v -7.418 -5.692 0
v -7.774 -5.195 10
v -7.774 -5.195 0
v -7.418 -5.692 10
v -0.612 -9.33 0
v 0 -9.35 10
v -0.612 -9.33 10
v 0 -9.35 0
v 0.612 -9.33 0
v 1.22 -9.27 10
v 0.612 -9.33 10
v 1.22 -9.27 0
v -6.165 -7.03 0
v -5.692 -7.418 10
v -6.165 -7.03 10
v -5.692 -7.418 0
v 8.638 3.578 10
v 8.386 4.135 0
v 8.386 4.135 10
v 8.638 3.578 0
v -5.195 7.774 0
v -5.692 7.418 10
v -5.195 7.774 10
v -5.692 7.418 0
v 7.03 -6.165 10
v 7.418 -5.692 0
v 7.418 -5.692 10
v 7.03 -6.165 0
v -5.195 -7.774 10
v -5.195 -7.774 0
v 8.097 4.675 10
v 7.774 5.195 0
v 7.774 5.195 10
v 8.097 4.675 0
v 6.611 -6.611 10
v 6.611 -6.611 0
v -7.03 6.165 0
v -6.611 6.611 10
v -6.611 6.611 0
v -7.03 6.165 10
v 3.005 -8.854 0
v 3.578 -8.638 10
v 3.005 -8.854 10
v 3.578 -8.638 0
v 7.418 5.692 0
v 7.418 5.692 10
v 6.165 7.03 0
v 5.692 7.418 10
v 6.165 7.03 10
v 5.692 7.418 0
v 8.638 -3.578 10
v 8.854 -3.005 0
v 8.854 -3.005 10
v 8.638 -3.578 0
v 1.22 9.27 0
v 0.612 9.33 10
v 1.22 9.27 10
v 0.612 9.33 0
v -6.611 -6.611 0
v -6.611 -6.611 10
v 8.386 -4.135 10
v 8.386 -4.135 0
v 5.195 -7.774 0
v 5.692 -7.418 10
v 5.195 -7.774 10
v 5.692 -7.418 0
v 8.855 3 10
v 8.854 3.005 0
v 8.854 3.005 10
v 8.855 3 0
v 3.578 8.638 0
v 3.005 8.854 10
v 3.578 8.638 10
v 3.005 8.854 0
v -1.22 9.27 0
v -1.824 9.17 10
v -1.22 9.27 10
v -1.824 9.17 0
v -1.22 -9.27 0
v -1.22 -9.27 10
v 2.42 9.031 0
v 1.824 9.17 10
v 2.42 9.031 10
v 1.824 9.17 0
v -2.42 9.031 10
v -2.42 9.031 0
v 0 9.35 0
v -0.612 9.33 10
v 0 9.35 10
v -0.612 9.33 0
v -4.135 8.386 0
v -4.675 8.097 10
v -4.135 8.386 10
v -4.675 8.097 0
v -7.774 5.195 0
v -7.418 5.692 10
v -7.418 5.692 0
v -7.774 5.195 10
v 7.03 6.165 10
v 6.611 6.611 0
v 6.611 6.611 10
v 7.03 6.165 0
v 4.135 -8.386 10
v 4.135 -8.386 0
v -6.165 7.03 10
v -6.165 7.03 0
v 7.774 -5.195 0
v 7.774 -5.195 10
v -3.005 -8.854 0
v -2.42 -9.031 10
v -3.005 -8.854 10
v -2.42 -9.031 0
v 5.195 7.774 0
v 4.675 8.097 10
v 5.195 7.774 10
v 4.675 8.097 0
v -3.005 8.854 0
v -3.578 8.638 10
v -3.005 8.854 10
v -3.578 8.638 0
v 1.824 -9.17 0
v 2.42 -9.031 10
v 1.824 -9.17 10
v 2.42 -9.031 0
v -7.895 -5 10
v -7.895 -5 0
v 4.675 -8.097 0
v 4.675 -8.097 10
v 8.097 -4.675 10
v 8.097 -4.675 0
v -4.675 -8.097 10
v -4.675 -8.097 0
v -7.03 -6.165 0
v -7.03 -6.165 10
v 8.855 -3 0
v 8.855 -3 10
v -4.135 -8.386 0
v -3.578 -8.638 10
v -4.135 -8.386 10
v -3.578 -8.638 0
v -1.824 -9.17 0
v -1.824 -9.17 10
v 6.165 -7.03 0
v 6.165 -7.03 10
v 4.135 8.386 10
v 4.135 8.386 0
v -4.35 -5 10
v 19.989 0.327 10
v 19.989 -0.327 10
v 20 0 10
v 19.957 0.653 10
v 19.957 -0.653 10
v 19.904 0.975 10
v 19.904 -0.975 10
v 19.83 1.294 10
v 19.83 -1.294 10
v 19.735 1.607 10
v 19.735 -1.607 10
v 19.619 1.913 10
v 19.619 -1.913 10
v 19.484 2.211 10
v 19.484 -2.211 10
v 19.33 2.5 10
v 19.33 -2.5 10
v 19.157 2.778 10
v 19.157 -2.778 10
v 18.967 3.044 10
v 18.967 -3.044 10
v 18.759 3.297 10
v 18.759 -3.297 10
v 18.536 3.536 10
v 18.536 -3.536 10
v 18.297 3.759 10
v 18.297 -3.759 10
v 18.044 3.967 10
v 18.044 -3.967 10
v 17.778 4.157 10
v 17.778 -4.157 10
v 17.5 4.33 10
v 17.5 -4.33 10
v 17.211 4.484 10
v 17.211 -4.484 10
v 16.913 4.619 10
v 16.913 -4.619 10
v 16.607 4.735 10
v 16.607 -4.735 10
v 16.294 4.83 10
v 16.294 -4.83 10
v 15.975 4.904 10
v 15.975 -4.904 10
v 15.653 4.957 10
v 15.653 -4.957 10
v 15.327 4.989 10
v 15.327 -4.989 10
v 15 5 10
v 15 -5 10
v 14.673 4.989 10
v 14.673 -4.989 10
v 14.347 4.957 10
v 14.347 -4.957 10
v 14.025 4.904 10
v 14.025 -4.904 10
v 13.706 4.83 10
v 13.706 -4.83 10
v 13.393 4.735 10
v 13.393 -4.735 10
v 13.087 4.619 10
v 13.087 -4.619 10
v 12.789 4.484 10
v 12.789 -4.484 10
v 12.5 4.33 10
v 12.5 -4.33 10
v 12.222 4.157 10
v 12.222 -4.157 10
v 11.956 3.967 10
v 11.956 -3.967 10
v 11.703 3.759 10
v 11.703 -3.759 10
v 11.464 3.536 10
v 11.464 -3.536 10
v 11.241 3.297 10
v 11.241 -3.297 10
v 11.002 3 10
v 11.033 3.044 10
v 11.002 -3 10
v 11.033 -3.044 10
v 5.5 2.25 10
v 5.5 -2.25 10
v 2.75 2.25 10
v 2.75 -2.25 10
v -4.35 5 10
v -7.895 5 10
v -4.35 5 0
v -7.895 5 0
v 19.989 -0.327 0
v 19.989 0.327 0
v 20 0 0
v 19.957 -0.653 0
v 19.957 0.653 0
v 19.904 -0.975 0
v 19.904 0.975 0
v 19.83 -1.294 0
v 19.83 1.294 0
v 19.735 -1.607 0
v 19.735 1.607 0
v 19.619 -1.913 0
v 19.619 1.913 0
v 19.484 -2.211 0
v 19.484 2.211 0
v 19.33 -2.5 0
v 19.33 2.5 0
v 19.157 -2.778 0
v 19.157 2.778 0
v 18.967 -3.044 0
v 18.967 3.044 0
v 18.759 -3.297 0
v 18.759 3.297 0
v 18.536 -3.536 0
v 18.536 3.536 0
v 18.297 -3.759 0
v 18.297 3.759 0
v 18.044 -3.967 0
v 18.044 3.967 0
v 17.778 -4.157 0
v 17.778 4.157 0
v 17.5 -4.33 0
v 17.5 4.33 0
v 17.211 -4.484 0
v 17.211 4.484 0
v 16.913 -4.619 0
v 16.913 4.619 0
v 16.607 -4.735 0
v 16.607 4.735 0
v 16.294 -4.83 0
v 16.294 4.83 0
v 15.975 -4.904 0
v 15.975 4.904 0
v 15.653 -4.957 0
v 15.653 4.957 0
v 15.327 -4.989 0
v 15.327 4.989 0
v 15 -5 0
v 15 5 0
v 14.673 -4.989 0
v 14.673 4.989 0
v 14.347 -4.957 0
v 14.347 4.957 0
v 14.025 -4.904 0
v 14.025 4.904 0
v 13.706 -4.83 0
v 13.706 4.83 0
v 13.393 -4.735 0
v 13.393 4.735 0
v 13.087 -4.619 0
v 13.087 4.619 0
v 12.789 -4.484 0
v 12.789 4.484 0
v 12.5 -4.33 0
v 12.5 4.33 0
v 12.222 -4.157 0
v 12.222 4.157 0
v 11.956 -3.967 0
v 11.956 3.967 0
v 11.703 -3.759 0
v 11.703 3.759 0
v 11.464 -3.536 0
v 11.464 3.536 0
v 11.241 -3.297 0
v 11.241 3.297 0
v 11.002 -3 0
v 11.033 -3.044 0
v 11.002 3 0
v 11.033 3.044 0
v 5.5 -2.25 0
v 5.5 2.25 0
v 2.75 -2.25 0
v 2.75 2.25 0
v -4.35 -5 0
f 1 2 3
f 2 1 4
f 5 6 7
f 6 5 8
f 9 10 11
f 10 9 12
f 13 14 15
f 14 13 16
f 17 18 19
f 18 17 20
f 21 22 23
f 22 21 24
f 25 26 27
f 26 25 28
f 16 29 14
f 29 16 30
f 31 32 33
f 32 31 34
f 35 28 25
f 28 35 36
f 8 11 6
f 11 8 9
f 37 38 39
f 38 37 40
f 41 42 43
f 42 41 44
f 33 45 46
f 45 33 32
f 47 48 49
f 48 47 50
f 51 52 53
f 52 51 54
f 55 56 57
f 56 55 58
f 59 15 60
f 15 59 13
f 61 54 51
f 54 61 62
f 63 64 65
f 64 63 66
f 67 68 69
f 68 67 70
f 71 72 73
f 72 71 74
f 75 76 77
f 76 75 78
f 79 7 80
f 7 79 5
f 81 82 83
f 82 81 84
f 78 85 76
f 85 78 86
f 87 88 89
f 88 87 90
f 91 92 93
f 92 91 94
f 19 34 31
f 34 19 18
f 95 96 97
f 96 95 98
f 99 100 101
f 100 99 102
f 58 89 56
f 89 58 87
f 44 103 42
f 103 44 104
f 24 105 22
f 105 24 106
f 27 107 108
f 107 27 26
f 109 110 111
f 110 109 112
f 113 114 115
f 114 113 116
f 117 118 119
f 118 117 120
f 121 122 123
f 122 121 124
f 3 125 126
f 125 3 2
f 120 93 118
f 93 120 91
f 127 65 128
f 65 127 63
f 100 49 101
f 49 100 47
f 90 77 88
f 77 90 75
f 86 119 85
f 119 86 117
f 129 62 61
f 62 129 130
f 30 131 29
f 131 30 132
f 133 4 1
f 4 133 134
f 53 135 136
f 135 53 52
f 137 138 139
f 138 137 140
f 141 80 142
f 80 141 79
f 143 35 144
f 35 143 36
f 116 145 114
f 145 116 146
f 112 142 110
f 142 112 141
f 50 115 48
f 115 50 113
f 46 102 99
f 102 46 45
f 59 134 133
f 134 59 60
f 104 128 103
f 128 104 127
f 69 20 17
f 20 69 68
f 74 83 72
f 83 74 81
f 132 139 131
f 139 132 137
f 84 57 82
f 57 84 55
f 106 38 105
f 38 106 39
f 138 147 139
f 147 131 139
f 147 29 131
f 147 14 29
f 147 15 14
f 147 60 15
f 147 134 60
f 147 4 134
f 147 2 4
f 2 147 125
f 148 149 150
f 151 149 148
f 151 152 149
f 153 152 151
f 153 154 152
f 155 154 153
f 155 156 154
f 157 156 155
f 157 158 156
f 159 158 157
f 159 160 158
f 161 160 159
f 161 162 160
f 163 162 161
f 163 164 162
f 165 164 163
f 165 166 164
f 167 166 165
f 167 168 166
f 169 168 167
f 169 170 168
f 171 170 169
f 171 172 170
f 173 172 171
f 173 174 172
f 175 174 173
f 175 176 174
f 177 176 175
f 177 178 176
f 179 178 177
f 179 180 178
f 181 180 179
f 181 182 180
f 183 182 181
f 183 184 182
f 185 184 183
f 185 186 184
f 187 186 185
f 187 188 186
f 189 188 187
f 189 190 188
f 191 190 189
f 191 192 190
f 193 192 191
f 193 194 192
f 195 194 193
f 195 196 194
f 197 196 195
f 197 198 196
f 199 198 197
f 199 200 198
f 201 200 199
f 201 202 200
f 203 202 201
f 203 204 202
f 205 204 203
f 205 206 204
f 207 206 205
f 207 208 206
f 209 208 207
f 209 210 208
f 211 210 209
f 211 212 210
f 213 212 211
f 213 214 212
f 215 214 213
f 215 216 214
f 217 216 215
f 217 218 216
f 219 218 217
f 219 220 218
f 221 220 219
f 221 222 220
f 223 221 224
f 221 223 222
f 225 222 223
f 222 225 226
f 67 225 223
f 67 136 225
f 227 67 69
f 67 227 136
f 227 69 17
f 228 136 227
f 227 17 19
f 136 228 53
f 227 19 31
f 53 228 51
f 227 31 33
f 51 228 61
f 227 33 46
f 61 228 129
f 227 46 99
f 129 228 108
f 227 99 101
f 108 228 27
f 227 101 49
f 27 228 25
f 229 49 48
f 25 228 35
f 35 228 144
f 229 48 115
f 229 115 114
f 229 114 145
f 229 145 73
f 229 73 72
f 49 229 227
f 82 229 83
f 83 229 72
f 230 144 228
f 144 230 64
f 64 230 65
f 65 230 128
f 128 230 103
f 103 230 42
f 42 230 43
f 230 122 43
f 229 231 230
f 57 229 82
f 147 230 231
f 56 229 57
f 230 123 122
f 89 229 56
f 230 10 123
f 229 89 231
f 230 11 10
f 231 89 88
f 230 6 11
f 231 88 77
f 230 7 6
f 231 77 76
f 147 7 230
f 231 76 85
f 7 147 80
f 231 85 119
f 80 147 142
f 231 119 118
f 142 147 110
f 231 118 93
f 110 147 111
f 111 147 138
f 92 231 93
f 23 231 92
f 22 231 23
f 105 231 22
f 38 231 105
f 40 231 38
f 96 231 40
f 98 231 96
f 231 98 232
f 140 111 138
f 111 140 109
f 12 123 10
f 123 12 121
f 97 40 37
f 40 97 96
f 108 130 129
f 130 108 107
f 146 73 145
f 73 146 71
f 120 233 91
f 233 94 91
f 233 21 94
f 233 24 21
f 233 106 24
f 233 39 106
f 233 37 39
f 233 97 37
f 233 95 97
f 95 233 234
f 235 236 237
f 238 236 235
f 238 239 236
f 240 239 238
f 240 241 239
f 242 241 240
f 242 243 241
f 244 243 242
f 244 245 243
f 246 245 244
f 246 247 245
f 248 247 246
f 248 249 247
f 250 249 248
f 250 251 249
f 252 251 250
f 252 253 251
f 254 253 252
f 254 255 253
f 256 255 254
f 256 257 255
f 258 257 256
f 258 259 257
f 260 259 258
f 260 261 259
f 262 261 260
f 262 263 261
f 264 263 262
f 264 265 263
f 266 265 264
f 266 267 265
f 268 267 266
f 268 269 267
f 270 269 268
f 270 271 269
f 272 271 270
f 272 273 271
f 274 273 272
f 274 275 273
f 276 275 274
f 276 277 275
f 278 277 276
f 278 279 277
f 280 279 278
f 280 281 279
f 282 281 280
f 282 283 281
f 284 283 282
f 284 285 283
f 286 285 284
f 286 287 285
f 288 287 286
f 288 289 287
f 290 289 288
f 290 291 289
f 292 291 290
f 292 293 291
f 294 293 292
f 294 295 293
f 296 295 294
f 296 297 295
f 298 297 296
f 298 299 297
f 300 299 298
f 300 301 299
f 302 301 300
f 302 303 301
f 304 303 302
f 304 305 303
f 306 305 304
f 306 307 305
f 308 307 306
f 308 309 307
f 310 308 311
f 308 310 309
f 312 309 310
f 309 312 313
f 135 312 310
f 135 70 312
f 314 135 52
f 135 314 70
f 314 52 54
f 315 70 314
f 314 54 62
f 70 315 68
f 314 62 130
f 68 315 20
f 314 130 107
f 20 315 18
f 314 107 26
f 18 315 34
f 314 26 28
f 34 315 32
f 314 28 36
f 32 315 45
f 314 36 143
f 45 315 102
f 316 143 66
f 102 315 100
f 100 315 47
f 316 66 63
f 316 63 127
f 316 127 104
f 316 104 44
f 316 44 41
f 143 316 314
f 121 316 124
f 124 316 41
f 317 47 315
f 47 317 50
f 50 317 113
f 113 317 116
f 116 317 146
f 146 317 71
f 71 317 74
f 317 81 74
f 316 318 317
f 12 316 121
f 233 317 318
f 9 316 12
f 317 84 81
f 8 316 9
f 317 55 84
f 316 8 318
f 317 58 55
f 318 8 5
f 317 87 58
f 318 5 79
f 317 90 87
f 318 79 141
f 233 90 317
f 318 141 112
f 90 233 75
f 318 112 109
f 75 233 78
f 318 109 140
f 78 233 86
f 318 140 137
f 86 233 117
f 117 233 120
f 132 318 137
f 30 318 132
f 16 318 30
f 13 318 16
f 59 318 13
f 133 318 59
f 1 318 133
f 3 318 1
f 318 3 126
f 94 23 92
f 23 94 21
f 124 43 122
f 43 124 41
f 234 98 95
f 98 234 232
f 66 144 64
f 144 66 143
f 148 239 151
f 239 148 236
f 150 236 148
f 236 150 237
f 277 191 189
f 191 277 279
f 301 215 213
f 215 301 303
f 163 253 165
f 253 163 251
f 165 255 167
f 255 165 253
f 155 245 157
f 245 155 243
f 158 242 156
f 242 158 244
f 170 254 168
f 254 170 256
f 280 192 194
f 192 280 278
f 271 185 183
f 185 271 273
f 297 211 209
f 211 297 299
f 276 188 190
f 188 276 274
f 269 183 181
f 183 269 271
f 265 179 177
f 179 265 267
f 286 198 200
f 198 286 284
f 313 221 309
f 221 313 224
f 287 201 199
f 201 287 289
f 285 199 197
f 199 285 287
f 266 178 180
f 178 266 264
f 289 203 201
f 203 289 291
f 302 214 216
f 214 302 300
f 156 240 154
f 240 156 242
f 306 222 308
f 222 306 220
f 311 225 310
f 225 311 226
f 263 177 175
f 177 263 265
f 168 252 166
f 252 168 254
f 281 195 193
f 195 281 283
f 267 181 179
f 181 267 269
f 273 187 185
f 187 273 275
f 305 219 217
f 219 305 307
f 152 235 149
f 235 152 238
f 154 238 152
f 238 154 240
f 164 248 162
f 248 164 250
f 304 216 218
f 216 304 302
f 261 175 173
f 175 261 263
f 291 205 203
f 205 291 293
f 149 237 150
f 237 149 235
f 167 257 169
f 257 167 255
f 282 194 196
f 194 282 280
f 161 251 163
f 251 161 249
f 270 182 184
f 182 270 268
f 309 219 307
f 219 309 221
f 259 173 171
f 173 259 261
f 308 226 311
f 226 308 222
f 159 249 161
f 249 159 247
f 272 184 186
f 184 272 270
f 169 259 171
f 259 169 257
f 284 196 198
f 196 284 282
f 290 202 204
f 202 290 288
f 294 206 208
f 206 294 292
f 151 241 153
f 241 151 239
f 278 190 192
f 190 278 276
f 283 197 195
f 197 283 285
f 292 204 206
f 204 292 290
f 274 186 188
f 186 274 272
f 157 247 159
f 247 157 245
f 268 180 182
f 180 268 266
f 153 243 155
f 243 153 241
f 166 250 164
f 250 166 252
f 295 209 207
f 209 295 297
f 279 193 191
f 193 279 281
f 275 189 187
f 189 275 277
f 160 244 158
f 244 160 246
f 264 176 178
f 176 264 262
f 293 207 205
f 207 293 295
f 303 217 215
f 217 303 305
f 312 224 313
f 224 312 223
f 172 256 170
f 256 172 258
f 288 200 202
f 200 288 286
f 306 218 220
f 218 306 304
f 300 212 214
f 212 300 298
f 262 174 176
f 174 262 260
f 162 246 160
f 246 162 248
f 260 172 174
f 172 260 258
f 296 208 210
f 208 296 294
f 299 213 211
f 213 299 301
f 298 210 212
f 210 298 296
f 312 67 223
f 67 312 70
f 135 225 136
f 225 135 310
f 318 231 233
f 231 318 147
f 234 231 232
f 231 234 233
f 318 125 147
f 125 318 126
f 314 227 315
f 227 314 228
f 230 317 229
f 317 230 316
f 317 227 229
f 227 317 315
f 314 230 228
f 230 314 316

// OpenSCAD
// Tubing clip for 12.7 mm lab stand rod
// Print orientation: flat on bed, extrusion along +Z

// ---- Stand rod ring ----
stand_id   = 12.7;   // stand rod inner diameter
stand_wall = 3;      // stand ring wall thickness
stand_od   = stand_id + 2 * stand_wall;  // 18.7 mm outer diameter

// ---- Tubing ring ----
tube_id    = 6;      // tubing inner diameter
tube_wall  = 2;      // tubing wall thickness
tube_od    = tube_id + 2 * tube_wall;    // 10 mm outer diameter

// ---- Bridge ----
bridge_w   = 6;      // bridge width in Y
bridge_x0  = 8;      // bridge start in X
bridge_x1  = 12;     // bridge end in X

// ---- Cutouts ----
stand_cut  = 10;     // stand ring opening width (-X side)
tube_cut   = 4.5;    // tubing ring opening width (+X side)

// ---- Misc ----
eps        = 0.5;    // cutter overshoot past faces
$fn        = 96;     // curve resolution

difference() {
    union() {
        // Stand rod ring
        cylinder(d = stand_od, h = 10);

        // Tubing ring
        translate([15, 0, 0])
            cylinder(d = tube_od, h = 10);

        // Solid bridge
        translate([bridge_x0, -bridge_w / 2, 0])
            cube([bridge_x1 - bridge_x0, bridge_w, 10]);
    }

    // Stand ring opening (x < 0, -5 < y < 5)
    translate([-stand_od / 2 - eps, -stand_cut / 2, -eps])
        cube([stand_cut / 2 + eps, stand_cut, 10 + 2 * eps]);

    // Tubing ring opening (x > 15, -2.25 < y < 2.25)
    translate([tube_od / 2 - tube_cut / 2, -tube_cut / 2, -eps])
        cube([tube_cut / 2 + eps, tube_cut, 10 + 2 * eps]);
}
